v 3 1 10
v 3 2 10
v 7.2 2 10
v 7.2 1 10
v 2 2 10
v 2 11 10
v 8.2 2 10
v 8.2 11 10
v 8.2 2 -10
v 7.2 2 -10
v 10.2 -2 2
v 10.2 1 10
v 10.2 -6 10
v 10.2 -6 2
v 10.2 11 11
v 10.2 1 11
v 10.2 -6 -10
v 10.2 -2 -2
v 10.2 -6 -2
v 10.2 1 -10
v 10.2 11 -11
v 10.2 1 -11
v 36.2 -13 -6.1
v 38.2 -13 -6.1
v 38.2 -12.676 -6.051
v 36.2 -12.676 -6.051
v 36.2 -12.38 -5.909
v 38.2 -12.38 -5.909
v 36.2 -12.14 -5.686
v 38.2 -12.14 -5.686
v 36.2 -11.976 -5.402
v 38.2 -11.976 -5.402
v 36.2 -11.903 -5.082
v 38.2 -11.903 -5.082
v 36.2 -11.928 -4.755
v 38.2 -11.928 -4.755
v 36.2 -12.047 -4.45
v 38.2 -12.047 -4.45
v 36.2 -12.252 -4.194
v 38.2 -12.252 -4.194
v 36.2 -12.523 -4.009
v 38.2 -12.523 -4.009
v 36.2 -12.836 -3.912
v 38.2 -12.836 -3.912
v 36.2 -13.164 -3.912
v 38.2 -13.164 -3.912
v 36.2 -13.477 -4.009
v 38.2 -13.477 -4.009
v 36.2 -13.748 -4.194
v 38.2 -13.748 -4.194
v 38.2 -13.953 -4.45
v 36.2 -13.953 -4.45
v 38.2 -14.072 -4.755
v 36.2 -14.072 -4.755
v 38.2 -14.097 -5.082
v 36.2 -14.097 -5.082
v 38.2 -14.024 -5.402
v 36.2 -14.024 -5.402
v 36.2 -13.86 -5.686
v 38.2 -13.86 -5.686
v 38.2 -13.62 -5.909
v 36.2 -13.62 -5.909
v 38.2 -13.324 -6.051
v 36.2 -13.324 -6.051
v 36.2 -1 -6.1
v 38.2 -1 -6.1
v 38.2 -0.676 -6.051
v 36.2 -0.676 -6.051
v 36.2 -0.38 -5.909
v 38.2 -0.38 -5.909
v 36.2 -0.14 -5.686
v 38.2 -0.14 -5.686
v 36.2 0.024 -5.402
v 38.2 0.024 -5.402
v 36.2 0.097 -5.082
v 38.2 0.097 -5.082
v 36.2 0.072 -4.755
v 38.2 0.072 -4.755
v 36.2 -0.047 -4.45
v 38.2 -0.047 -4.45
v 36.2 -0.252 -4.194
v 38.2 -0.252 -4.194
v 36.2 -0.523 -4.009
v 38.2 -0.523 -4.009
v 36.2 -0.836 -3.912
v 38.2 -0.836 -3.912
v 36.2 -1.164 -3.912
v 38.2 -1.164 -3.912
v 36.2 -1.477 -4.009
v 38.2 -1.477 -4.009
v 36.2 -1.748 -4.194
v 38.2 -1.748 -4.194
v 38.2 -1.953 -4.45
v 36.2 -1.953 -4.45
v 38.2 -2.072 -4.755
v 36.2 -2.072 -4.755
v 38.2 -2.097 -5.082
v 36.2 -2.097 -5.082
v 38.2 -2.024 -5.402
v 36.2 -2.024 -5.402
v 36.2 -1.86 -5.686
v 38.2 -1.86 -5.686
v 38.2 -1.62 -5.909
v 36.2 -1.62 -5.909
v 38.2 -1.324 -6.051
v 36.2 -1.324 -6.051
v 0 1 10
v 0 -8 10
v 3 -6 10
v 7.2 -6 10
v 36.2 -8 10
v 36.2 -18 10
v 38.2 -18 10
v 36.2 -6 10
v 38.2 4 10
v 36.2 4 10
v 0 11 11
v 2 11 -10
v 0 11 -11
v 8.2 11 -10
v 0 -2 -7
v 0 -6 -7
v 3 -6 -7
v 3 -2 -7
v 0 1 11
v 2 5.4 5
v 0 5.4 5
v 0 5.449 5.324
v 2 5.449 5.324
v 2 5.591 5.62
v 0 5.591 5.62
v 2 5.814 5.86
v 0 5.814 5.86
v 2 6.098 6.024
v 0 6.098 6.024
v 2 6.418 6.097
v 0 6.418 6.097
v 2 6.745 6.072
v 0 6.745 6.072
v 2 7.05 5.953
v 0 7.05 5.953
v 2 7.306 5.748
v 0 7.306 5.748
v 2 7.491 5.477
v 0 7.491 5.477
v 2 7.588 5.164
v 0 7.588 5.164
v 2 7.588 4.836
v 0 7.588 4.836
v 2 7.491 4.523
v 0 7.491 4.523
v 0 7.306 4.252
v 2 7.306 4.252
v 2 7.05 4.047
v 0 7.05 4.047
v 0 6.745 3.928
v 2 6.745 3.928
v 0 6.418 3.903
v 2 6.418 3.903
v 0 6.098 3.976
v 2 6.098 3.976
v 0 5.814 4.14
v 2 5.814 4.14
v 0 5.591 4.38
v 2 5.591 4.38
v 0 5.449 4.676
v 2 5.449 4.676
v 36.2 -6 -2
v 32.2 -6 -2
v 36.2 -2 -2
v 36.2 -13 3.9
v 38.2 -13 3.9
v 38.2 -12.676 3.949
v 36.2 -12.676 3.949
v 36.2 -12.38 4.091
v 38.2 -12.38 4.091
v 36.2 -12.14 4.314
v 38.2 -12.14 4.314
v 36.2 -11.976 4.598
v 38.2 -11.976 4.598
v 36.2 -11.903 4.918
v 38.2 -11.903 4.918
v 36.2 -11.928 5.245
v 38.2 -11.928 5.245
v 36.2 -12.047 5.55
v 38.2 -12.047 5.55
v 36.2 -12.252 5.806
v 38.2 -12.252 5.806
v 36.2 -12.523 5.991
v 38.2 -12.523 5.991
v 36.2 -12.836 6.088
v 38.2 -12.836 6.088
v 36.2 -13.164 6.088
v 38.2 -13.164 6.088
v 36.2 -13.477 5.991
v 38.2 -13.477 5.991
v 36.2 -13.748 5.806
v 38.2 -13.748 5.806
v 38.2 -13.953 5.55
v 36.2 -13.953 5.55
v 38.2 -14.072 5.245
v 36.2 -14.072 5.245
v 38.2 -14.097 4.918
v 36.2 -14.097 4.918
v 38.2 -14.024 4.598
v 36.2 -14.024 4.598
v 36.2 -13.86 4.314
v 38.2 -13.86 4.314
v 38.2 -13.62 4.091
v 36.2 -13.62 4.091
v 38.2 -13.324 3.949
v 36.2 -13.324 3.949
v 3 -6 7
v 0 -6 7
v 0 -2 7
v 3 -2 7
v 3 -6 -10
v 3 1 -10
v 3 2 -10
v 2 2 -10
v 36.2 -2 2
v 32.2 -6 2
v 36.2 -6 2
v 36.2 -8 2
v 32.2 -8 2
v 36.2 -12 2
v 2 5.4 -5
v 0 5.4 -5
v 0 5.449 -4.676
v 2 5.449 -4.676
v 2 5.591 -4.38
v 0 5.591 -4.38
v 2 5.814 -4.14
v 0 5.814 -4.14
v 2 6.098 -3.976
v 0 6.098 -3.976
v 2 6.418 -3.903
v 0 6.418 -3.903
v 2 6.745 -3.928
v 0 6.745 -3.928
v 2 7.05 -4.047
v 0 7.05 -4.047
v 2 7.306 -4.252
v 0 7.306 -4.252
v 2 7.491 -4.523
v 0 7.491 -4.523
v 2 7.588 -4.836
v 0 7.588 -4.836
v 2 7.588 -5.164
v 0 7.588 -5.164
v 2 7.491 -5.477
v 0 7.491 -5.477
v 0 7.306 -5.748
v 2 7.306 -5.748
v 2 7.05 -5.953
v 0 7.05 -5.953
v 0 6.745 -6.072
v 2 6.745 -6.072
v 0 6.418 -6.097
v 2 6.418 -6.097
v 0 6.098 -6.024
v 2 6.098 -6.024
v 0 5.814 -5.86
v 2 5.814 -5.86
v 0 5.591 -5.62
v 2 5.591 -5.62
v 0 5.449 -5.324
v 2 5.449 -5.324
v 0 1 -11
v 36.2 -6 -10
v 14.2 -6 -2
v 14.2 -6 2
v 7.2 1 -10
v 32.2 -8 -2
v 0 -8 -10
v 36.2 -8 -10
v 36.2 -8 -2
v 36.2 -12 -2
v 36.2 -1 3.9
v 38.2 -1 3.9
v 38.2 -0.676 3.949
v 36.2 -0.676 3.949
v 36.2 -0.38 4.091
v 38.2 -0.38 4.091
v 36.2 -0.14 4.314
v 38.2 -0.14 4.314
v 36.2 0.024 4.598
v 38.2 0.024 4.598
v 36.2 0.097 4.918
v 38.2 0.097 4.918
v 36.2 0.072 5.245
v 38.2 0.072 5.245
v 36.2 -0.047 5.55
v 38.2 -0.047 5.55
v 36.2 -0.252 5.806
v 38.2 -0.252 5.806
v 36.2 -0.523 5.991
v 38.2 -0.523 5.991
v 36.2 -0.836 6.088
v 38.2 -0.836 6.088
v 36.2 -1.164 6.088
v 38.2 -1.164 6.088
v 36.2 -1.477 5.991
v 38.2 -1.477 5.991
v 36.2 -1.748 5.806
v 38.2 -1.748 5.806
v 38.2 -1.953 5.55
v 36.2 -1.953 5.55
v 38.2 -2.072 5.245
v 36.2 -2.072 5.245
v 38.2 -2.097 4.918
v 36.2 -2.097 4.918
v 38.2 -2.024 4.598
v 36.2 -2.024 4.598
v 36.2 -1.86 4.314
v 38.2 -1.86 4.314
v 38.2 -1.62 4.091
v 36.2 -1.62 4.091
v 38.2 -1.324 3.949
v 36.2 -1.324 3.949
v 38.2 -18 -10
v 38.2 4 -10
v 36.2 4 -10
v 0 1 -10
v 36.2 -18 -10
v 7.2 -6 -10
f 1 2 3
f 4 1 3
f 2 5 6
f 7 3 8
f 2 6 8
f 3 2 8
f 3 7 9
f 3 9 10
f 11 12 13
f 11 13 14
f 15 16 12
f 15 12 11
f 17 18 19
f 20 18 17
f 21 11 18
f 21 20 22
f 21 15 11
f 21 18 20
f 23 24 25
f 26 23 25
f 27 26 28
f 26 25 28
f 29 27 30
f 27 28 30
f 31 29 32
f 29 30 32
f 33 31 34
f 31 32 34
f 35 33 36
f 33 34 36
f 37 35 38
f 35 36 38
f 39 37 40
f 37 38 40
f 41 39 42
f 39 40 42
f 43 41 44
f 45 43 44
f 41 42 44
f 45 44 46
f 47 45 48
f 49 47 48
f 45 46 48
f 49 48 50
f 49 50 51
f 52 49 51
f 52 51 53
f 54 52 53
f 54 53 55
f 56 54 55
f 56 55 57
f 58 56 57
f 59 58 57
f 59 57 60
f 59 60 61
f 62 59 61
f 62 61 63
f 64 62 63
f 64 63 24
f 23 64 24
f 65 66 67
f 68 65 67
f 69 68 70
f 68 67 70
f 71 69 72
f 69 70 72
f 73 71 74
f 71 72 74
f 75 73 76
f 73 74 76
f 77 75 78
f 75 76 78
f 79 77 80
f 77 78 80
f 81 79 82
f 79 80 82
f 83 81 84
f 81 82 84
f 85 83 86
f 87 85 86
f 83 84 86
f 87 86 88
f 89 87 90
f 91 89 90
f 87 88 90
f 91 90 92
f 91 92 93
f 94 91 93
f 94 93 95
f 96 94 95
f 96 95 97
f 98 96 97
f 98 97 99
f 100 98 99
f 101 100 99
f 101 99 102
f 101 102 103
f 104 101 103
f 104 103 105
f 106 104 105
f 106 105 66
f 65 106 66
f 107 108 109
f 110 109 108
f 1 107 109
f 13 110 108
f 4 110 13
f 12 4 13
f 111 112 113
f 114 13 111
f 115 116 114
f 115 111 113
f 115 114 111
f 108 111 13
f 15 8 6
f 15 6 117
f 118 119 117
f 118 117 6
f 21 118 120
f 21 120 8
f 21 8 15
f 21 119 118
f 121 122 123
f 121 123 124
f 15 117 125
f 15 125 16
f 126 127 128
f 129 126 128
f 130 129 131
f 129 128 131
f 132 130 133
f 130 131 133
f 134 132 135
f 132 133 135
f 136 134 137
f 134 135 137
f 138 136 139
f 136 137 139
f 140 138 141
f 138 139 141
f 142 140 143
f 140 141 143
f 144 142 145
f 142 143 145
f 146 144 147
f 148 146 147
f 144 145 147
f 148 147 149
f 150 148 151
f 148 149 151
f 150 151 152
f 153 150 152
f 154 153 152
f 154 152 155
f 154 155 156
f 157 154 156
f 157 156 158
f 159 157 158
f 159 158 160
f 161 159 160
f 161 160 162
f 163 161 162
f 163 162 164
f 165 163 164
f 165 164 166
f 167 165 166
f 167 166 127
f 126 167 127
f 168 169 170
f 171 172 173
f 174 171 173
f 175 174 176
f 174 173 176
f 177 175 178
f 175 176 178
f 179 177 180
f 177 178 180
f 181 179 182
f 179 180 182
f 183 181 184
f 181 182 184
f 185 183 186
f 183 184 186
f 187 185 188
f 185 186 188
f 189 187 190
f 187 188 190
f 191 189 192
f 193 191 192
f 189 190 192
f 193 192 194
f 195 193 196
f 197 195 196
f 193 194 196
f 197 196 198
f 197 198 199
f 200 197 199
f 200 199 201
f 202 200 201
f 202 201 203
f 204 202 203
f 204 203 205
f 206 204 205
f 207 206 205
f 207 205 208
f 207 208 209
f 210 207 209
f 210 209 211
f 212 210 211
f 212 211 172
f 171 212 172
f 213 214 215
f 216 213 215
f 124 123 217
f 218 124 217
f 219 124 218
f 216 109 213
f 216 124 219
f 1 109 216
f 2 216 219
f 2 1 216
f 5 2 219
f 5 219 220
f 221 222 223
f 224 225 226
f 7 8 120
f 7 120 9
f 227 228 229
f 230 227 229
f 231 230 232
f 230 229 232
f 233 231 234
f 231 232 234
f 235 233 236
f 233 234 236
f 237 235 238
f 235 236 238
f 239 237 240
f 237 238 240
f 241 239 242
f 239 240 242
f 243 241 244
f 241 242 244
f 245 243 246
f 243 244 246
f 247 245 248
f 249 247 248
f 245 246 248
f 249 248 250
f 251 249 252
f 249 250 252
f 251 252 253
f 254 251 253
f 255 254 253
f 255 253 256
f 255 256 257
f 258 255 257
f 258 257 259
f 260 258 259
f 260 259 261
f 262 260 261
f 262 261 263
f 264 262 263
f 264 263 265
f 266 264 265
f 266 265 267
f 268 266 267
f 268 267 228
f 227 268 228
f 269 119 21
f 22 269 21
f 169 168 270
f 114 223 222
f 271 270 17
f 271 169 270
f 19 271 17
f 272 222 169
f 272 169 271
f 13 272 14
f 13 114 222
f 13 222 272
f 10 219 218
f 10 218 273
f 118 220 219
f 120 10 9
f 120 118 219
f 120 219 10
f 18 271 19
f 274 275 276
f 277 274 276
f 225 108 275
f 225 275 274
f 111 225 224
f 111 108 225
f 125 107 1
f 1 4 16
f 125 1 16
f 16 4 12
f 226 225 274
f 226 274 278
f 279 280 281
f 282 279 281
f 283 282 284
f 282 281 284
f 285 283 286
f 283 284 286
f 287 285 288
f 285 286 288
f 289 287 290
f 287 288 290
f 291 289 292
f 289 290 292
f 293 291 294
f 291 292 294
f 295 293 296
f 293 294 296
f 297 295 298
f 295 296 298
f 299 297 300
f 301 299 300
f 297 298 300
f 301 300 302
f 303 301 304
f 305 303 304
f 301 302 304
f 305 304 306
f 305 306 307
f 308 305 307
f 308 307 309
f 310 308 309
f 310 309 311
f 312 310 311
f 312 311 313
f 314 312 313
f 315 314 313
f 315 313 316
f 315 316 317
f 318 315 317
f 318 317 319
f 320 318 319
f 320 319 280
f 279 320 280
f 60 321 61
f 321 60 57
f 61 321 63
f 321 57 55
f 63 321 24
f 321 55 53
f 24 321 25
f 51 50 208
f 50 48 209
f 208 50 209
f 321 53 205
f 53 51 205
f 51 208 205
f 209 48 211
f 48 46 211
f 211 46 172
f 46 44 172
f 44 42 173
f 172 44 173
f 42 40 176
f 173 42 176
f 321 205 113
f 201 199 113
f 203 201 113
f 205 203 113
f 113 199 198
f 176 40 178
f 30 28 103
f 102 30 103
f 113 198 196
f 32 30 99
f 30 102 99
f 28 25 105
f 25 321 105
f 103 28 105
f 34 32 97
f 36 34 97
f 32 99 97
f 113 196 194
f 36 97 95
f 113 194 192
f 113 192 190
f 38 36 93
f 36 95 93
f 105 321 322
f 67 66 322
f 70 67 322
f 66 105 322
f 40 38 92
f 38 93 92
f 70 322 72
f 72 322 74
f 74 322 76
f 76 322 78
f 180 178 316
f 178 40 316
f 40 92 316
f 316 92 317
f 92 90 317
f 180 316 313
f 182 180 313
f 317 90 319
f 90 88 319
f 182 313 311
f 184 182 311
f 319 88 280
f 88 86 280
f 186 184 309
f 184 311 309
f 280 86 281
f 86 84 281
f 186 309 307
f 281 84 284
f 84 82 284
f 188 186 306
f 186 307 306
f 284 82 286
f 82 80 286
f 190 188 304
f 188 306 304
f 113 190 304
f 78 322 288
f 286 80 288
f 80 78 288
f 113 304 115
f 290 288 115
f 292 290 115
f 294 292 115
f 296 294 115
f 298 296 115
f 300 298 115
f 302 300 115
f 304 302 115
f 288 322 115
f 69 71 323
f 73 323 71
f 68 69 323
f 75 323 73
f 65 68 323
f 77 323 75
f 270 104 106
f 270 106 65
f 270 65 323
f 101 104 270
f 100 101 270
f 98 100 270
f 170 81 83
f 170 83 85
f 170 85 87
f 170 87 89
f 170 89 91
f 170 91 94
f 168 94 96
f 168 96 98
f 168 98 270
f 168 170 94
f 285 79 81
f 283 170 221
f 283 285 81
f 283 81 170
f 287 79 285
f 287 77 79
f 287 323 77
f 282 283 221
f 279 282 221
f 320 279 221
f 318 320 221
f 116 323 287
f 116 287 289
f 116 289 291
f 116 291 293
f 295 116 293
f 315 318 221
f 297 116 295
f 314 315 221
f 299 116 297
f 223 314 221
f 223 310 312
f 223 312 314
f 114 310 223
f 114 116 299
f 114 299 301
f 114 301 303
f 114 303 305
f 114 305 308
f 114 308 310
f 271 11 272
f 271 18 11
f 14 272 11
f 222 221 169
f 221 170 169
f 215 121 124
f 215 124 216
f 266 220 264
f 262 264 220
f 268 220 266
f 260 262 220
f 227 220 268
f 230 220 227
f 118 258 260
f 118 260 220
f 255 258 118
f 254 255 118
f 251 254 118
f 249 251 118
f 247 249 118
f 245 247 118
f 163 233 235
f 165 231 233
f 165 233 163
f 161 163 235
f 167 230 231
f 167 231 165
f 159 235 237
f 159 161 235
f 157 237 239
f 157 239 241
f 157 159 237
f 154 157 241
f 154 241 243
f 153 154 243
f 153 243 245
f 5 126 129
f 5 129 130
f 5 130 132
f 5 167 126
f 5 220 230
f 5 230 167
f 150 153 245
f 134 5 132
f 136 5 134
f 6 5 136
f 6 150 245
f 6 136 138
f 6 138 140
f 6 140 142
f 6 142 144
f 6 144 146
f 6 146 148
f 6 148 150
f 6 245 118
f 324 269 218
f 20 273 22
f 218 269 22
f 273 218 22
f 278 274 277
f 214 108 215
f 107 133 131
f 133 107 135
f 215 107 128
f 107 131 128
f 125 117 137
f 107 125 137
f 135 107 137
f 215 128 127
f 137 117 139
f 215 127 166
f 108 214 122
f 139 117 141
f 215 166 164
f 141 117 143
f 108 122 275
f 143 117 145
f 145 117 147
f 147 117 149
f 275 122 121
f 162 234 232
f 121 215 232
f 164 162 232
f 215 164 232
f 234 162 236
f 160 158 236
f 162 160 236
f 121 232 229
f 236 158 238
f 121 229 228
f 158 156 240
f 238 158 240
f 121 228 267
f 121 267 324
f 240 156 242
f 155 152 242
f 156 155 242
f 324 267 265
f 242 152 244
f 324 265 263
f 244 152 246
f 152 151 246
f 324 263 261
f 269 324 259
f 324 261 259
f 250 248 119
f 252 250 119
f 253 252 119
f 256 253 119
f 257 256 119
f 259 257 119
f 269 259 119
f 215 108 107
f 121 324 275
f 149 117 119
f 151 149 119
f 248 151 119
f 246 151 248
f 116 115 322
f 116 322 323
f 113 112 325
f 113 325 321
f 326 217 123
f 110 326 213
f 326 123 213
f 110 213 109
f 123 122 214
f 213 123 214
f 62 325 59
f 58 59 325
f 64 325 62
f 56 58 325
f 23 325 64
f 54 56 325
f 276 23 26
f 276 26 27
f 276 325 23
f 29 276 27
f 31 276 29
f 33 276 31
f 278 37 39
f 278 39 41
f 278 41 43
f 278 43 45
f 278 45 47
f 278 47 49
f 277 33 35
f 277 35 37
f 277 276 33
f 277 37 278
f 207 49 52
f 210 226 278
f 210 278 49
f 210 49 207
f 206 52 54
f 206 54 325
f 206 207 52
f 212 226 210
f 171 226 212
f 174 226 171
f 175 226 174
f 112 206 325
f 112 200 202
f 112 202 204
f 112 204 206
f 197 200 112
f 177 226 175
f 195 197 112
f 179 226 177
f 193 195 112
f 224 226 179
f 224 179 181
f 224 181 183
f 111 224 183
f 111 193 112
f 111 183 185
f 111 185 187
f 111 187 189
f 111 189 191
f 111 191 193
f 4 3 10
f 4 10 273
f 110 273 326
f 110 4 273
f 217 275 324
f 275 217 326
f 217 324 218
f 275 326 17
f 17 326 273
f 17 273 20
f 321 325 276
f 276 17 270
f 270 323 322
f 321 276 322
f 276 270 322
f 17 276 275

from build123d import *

# Parameters (mm, degrees)
BOSS_EXTRUDE1_DEPTH = 10
SKETCH2_W           = 14
SKETCH2_H           = 4
CUT_EXTRUDE1_DEPTH  = 3
SKETCH13_R          = 1.1
CUT_EXTRUDE4_DEPTH  = 5
SKETCH14_W          = 2
SKETCH14_H          = 20
BOSS_EXTRUDE2_DEPTH = 10
BOSS_EXTRUDE3_DEPTH = 2
SKETCH17_R          = 1.1
CUT_EXTRUDE5_DEPTH  = 4
SKETCH18_W          = 10.2
SKETCH18_H          = 1
BOSS_EXTRUDE4_DEPTH = 10


with BuildPart() as part:
    # Sketch1 → Boss-Extrude1 (new, symmetric)
    with BuildSketch(Plane.XY):
        Polygon((0, 11), (0, -8), (8.2, -8), (38.2, -8), (38.2, -6), (38.2, 4), (36.2, 4), (36.2, -6), (10.2, -6), (10.2, 11), (8.2, 11), (8.2, 2), (7.2, 2), (7.2, -6), (3, -6), (3, 2), (2, 2), (2, 11), align=None)
    extrude(amount=BOSS_EXTRUDE1_DEPTH, both=True)

    # Sketch2 → Cut-Extrude1 (cut)
    with BuildSketch(Plane.ZY):
        with Locations((0, -4)):
            Rectangle(SKETCH2_W, SKETCH2_H)
    extrude(amount=-CUT_EXTRUDE1_DEPTH, mode=Mode.SUBTRACT)

    # Sketch13 → Cut-Extrude4 (cut)
    with BuildSketch(Plane.ZY):
        with Locations(Location((-5, 6.5, 0), (0, 0, 270))):
            Circle(SKETCH13_R)
        with Locations(Location((5, 6.5, 0), (0, 0, 270))):
            Circle(SKETCH13_R)
    extrude(amount=-CUT_EXTRUDE4_DEPTH, mode=Mode.SUBTRACT)

    # Sketch14 → Boss-Extrude2 (add)
    with BuildSketch(Plane.XZ.offset(8)):
        with Locations((37.2, 0)):
            Rectangle(SKETCH14_W, SKETCH14_H)
    extrude(amount=BOSS_EXTRUDE2_DEPTH)

    # Sketch15 → Boss-Extrude3 (add, symmetric)
    with BuildSketch(Plane.XY):
        Polygon((14.2, -6), (10.2, -6), (10.2, -2), align=None)
        Polygon((36.2, -6), (36.2, -2), (32.2, -6), align=None)
        Polygon((36.2, -8), (32.2, -8), (36.2, -12), align=None)
    extrude(amount=BOSS_EXTRUDE3_DEPTH, both=True)

    # Sketch17 → Cut-Extrude5 (cut)
    with BuildSketch(Plane(origin=(38.2, 0, 0), x_dir=(0, 0, -1), z_dir=(1, 0, 0))):
        with Locations((-5, -1)):
            Circle(SKETCH17_R)
        with Locations((5, -1)):
            Circle(SKETCH17_R)
        with Locations((-5, -13)):
            Circle(SKETCH17_R)
        with Locations((5, -13)):
            Circle(SKETCH17_R)
    extrude(amount=-CUT_EXTRUDE5_DEPTH, mode=Mode.SUBTRACT)

    # Sketch18 → Boss-Extrude4 (add)
    with BuildSketch(Plane(origin=(0, 11, 0), x_dir=(1, 0, 0), z_dir=(0, 1, 0))):
        with Locations((5.1, -10.5)):
            Rectangle(SKETCH18_W, SKETCH18_H)
        with Locations((5.1, 10.5)):
            Rectangle(SKETCH18_W, SKETCH18_H)
    extrude(amount=-BOSS_EXTRUDE4_DEPTH)


solid = part.part
